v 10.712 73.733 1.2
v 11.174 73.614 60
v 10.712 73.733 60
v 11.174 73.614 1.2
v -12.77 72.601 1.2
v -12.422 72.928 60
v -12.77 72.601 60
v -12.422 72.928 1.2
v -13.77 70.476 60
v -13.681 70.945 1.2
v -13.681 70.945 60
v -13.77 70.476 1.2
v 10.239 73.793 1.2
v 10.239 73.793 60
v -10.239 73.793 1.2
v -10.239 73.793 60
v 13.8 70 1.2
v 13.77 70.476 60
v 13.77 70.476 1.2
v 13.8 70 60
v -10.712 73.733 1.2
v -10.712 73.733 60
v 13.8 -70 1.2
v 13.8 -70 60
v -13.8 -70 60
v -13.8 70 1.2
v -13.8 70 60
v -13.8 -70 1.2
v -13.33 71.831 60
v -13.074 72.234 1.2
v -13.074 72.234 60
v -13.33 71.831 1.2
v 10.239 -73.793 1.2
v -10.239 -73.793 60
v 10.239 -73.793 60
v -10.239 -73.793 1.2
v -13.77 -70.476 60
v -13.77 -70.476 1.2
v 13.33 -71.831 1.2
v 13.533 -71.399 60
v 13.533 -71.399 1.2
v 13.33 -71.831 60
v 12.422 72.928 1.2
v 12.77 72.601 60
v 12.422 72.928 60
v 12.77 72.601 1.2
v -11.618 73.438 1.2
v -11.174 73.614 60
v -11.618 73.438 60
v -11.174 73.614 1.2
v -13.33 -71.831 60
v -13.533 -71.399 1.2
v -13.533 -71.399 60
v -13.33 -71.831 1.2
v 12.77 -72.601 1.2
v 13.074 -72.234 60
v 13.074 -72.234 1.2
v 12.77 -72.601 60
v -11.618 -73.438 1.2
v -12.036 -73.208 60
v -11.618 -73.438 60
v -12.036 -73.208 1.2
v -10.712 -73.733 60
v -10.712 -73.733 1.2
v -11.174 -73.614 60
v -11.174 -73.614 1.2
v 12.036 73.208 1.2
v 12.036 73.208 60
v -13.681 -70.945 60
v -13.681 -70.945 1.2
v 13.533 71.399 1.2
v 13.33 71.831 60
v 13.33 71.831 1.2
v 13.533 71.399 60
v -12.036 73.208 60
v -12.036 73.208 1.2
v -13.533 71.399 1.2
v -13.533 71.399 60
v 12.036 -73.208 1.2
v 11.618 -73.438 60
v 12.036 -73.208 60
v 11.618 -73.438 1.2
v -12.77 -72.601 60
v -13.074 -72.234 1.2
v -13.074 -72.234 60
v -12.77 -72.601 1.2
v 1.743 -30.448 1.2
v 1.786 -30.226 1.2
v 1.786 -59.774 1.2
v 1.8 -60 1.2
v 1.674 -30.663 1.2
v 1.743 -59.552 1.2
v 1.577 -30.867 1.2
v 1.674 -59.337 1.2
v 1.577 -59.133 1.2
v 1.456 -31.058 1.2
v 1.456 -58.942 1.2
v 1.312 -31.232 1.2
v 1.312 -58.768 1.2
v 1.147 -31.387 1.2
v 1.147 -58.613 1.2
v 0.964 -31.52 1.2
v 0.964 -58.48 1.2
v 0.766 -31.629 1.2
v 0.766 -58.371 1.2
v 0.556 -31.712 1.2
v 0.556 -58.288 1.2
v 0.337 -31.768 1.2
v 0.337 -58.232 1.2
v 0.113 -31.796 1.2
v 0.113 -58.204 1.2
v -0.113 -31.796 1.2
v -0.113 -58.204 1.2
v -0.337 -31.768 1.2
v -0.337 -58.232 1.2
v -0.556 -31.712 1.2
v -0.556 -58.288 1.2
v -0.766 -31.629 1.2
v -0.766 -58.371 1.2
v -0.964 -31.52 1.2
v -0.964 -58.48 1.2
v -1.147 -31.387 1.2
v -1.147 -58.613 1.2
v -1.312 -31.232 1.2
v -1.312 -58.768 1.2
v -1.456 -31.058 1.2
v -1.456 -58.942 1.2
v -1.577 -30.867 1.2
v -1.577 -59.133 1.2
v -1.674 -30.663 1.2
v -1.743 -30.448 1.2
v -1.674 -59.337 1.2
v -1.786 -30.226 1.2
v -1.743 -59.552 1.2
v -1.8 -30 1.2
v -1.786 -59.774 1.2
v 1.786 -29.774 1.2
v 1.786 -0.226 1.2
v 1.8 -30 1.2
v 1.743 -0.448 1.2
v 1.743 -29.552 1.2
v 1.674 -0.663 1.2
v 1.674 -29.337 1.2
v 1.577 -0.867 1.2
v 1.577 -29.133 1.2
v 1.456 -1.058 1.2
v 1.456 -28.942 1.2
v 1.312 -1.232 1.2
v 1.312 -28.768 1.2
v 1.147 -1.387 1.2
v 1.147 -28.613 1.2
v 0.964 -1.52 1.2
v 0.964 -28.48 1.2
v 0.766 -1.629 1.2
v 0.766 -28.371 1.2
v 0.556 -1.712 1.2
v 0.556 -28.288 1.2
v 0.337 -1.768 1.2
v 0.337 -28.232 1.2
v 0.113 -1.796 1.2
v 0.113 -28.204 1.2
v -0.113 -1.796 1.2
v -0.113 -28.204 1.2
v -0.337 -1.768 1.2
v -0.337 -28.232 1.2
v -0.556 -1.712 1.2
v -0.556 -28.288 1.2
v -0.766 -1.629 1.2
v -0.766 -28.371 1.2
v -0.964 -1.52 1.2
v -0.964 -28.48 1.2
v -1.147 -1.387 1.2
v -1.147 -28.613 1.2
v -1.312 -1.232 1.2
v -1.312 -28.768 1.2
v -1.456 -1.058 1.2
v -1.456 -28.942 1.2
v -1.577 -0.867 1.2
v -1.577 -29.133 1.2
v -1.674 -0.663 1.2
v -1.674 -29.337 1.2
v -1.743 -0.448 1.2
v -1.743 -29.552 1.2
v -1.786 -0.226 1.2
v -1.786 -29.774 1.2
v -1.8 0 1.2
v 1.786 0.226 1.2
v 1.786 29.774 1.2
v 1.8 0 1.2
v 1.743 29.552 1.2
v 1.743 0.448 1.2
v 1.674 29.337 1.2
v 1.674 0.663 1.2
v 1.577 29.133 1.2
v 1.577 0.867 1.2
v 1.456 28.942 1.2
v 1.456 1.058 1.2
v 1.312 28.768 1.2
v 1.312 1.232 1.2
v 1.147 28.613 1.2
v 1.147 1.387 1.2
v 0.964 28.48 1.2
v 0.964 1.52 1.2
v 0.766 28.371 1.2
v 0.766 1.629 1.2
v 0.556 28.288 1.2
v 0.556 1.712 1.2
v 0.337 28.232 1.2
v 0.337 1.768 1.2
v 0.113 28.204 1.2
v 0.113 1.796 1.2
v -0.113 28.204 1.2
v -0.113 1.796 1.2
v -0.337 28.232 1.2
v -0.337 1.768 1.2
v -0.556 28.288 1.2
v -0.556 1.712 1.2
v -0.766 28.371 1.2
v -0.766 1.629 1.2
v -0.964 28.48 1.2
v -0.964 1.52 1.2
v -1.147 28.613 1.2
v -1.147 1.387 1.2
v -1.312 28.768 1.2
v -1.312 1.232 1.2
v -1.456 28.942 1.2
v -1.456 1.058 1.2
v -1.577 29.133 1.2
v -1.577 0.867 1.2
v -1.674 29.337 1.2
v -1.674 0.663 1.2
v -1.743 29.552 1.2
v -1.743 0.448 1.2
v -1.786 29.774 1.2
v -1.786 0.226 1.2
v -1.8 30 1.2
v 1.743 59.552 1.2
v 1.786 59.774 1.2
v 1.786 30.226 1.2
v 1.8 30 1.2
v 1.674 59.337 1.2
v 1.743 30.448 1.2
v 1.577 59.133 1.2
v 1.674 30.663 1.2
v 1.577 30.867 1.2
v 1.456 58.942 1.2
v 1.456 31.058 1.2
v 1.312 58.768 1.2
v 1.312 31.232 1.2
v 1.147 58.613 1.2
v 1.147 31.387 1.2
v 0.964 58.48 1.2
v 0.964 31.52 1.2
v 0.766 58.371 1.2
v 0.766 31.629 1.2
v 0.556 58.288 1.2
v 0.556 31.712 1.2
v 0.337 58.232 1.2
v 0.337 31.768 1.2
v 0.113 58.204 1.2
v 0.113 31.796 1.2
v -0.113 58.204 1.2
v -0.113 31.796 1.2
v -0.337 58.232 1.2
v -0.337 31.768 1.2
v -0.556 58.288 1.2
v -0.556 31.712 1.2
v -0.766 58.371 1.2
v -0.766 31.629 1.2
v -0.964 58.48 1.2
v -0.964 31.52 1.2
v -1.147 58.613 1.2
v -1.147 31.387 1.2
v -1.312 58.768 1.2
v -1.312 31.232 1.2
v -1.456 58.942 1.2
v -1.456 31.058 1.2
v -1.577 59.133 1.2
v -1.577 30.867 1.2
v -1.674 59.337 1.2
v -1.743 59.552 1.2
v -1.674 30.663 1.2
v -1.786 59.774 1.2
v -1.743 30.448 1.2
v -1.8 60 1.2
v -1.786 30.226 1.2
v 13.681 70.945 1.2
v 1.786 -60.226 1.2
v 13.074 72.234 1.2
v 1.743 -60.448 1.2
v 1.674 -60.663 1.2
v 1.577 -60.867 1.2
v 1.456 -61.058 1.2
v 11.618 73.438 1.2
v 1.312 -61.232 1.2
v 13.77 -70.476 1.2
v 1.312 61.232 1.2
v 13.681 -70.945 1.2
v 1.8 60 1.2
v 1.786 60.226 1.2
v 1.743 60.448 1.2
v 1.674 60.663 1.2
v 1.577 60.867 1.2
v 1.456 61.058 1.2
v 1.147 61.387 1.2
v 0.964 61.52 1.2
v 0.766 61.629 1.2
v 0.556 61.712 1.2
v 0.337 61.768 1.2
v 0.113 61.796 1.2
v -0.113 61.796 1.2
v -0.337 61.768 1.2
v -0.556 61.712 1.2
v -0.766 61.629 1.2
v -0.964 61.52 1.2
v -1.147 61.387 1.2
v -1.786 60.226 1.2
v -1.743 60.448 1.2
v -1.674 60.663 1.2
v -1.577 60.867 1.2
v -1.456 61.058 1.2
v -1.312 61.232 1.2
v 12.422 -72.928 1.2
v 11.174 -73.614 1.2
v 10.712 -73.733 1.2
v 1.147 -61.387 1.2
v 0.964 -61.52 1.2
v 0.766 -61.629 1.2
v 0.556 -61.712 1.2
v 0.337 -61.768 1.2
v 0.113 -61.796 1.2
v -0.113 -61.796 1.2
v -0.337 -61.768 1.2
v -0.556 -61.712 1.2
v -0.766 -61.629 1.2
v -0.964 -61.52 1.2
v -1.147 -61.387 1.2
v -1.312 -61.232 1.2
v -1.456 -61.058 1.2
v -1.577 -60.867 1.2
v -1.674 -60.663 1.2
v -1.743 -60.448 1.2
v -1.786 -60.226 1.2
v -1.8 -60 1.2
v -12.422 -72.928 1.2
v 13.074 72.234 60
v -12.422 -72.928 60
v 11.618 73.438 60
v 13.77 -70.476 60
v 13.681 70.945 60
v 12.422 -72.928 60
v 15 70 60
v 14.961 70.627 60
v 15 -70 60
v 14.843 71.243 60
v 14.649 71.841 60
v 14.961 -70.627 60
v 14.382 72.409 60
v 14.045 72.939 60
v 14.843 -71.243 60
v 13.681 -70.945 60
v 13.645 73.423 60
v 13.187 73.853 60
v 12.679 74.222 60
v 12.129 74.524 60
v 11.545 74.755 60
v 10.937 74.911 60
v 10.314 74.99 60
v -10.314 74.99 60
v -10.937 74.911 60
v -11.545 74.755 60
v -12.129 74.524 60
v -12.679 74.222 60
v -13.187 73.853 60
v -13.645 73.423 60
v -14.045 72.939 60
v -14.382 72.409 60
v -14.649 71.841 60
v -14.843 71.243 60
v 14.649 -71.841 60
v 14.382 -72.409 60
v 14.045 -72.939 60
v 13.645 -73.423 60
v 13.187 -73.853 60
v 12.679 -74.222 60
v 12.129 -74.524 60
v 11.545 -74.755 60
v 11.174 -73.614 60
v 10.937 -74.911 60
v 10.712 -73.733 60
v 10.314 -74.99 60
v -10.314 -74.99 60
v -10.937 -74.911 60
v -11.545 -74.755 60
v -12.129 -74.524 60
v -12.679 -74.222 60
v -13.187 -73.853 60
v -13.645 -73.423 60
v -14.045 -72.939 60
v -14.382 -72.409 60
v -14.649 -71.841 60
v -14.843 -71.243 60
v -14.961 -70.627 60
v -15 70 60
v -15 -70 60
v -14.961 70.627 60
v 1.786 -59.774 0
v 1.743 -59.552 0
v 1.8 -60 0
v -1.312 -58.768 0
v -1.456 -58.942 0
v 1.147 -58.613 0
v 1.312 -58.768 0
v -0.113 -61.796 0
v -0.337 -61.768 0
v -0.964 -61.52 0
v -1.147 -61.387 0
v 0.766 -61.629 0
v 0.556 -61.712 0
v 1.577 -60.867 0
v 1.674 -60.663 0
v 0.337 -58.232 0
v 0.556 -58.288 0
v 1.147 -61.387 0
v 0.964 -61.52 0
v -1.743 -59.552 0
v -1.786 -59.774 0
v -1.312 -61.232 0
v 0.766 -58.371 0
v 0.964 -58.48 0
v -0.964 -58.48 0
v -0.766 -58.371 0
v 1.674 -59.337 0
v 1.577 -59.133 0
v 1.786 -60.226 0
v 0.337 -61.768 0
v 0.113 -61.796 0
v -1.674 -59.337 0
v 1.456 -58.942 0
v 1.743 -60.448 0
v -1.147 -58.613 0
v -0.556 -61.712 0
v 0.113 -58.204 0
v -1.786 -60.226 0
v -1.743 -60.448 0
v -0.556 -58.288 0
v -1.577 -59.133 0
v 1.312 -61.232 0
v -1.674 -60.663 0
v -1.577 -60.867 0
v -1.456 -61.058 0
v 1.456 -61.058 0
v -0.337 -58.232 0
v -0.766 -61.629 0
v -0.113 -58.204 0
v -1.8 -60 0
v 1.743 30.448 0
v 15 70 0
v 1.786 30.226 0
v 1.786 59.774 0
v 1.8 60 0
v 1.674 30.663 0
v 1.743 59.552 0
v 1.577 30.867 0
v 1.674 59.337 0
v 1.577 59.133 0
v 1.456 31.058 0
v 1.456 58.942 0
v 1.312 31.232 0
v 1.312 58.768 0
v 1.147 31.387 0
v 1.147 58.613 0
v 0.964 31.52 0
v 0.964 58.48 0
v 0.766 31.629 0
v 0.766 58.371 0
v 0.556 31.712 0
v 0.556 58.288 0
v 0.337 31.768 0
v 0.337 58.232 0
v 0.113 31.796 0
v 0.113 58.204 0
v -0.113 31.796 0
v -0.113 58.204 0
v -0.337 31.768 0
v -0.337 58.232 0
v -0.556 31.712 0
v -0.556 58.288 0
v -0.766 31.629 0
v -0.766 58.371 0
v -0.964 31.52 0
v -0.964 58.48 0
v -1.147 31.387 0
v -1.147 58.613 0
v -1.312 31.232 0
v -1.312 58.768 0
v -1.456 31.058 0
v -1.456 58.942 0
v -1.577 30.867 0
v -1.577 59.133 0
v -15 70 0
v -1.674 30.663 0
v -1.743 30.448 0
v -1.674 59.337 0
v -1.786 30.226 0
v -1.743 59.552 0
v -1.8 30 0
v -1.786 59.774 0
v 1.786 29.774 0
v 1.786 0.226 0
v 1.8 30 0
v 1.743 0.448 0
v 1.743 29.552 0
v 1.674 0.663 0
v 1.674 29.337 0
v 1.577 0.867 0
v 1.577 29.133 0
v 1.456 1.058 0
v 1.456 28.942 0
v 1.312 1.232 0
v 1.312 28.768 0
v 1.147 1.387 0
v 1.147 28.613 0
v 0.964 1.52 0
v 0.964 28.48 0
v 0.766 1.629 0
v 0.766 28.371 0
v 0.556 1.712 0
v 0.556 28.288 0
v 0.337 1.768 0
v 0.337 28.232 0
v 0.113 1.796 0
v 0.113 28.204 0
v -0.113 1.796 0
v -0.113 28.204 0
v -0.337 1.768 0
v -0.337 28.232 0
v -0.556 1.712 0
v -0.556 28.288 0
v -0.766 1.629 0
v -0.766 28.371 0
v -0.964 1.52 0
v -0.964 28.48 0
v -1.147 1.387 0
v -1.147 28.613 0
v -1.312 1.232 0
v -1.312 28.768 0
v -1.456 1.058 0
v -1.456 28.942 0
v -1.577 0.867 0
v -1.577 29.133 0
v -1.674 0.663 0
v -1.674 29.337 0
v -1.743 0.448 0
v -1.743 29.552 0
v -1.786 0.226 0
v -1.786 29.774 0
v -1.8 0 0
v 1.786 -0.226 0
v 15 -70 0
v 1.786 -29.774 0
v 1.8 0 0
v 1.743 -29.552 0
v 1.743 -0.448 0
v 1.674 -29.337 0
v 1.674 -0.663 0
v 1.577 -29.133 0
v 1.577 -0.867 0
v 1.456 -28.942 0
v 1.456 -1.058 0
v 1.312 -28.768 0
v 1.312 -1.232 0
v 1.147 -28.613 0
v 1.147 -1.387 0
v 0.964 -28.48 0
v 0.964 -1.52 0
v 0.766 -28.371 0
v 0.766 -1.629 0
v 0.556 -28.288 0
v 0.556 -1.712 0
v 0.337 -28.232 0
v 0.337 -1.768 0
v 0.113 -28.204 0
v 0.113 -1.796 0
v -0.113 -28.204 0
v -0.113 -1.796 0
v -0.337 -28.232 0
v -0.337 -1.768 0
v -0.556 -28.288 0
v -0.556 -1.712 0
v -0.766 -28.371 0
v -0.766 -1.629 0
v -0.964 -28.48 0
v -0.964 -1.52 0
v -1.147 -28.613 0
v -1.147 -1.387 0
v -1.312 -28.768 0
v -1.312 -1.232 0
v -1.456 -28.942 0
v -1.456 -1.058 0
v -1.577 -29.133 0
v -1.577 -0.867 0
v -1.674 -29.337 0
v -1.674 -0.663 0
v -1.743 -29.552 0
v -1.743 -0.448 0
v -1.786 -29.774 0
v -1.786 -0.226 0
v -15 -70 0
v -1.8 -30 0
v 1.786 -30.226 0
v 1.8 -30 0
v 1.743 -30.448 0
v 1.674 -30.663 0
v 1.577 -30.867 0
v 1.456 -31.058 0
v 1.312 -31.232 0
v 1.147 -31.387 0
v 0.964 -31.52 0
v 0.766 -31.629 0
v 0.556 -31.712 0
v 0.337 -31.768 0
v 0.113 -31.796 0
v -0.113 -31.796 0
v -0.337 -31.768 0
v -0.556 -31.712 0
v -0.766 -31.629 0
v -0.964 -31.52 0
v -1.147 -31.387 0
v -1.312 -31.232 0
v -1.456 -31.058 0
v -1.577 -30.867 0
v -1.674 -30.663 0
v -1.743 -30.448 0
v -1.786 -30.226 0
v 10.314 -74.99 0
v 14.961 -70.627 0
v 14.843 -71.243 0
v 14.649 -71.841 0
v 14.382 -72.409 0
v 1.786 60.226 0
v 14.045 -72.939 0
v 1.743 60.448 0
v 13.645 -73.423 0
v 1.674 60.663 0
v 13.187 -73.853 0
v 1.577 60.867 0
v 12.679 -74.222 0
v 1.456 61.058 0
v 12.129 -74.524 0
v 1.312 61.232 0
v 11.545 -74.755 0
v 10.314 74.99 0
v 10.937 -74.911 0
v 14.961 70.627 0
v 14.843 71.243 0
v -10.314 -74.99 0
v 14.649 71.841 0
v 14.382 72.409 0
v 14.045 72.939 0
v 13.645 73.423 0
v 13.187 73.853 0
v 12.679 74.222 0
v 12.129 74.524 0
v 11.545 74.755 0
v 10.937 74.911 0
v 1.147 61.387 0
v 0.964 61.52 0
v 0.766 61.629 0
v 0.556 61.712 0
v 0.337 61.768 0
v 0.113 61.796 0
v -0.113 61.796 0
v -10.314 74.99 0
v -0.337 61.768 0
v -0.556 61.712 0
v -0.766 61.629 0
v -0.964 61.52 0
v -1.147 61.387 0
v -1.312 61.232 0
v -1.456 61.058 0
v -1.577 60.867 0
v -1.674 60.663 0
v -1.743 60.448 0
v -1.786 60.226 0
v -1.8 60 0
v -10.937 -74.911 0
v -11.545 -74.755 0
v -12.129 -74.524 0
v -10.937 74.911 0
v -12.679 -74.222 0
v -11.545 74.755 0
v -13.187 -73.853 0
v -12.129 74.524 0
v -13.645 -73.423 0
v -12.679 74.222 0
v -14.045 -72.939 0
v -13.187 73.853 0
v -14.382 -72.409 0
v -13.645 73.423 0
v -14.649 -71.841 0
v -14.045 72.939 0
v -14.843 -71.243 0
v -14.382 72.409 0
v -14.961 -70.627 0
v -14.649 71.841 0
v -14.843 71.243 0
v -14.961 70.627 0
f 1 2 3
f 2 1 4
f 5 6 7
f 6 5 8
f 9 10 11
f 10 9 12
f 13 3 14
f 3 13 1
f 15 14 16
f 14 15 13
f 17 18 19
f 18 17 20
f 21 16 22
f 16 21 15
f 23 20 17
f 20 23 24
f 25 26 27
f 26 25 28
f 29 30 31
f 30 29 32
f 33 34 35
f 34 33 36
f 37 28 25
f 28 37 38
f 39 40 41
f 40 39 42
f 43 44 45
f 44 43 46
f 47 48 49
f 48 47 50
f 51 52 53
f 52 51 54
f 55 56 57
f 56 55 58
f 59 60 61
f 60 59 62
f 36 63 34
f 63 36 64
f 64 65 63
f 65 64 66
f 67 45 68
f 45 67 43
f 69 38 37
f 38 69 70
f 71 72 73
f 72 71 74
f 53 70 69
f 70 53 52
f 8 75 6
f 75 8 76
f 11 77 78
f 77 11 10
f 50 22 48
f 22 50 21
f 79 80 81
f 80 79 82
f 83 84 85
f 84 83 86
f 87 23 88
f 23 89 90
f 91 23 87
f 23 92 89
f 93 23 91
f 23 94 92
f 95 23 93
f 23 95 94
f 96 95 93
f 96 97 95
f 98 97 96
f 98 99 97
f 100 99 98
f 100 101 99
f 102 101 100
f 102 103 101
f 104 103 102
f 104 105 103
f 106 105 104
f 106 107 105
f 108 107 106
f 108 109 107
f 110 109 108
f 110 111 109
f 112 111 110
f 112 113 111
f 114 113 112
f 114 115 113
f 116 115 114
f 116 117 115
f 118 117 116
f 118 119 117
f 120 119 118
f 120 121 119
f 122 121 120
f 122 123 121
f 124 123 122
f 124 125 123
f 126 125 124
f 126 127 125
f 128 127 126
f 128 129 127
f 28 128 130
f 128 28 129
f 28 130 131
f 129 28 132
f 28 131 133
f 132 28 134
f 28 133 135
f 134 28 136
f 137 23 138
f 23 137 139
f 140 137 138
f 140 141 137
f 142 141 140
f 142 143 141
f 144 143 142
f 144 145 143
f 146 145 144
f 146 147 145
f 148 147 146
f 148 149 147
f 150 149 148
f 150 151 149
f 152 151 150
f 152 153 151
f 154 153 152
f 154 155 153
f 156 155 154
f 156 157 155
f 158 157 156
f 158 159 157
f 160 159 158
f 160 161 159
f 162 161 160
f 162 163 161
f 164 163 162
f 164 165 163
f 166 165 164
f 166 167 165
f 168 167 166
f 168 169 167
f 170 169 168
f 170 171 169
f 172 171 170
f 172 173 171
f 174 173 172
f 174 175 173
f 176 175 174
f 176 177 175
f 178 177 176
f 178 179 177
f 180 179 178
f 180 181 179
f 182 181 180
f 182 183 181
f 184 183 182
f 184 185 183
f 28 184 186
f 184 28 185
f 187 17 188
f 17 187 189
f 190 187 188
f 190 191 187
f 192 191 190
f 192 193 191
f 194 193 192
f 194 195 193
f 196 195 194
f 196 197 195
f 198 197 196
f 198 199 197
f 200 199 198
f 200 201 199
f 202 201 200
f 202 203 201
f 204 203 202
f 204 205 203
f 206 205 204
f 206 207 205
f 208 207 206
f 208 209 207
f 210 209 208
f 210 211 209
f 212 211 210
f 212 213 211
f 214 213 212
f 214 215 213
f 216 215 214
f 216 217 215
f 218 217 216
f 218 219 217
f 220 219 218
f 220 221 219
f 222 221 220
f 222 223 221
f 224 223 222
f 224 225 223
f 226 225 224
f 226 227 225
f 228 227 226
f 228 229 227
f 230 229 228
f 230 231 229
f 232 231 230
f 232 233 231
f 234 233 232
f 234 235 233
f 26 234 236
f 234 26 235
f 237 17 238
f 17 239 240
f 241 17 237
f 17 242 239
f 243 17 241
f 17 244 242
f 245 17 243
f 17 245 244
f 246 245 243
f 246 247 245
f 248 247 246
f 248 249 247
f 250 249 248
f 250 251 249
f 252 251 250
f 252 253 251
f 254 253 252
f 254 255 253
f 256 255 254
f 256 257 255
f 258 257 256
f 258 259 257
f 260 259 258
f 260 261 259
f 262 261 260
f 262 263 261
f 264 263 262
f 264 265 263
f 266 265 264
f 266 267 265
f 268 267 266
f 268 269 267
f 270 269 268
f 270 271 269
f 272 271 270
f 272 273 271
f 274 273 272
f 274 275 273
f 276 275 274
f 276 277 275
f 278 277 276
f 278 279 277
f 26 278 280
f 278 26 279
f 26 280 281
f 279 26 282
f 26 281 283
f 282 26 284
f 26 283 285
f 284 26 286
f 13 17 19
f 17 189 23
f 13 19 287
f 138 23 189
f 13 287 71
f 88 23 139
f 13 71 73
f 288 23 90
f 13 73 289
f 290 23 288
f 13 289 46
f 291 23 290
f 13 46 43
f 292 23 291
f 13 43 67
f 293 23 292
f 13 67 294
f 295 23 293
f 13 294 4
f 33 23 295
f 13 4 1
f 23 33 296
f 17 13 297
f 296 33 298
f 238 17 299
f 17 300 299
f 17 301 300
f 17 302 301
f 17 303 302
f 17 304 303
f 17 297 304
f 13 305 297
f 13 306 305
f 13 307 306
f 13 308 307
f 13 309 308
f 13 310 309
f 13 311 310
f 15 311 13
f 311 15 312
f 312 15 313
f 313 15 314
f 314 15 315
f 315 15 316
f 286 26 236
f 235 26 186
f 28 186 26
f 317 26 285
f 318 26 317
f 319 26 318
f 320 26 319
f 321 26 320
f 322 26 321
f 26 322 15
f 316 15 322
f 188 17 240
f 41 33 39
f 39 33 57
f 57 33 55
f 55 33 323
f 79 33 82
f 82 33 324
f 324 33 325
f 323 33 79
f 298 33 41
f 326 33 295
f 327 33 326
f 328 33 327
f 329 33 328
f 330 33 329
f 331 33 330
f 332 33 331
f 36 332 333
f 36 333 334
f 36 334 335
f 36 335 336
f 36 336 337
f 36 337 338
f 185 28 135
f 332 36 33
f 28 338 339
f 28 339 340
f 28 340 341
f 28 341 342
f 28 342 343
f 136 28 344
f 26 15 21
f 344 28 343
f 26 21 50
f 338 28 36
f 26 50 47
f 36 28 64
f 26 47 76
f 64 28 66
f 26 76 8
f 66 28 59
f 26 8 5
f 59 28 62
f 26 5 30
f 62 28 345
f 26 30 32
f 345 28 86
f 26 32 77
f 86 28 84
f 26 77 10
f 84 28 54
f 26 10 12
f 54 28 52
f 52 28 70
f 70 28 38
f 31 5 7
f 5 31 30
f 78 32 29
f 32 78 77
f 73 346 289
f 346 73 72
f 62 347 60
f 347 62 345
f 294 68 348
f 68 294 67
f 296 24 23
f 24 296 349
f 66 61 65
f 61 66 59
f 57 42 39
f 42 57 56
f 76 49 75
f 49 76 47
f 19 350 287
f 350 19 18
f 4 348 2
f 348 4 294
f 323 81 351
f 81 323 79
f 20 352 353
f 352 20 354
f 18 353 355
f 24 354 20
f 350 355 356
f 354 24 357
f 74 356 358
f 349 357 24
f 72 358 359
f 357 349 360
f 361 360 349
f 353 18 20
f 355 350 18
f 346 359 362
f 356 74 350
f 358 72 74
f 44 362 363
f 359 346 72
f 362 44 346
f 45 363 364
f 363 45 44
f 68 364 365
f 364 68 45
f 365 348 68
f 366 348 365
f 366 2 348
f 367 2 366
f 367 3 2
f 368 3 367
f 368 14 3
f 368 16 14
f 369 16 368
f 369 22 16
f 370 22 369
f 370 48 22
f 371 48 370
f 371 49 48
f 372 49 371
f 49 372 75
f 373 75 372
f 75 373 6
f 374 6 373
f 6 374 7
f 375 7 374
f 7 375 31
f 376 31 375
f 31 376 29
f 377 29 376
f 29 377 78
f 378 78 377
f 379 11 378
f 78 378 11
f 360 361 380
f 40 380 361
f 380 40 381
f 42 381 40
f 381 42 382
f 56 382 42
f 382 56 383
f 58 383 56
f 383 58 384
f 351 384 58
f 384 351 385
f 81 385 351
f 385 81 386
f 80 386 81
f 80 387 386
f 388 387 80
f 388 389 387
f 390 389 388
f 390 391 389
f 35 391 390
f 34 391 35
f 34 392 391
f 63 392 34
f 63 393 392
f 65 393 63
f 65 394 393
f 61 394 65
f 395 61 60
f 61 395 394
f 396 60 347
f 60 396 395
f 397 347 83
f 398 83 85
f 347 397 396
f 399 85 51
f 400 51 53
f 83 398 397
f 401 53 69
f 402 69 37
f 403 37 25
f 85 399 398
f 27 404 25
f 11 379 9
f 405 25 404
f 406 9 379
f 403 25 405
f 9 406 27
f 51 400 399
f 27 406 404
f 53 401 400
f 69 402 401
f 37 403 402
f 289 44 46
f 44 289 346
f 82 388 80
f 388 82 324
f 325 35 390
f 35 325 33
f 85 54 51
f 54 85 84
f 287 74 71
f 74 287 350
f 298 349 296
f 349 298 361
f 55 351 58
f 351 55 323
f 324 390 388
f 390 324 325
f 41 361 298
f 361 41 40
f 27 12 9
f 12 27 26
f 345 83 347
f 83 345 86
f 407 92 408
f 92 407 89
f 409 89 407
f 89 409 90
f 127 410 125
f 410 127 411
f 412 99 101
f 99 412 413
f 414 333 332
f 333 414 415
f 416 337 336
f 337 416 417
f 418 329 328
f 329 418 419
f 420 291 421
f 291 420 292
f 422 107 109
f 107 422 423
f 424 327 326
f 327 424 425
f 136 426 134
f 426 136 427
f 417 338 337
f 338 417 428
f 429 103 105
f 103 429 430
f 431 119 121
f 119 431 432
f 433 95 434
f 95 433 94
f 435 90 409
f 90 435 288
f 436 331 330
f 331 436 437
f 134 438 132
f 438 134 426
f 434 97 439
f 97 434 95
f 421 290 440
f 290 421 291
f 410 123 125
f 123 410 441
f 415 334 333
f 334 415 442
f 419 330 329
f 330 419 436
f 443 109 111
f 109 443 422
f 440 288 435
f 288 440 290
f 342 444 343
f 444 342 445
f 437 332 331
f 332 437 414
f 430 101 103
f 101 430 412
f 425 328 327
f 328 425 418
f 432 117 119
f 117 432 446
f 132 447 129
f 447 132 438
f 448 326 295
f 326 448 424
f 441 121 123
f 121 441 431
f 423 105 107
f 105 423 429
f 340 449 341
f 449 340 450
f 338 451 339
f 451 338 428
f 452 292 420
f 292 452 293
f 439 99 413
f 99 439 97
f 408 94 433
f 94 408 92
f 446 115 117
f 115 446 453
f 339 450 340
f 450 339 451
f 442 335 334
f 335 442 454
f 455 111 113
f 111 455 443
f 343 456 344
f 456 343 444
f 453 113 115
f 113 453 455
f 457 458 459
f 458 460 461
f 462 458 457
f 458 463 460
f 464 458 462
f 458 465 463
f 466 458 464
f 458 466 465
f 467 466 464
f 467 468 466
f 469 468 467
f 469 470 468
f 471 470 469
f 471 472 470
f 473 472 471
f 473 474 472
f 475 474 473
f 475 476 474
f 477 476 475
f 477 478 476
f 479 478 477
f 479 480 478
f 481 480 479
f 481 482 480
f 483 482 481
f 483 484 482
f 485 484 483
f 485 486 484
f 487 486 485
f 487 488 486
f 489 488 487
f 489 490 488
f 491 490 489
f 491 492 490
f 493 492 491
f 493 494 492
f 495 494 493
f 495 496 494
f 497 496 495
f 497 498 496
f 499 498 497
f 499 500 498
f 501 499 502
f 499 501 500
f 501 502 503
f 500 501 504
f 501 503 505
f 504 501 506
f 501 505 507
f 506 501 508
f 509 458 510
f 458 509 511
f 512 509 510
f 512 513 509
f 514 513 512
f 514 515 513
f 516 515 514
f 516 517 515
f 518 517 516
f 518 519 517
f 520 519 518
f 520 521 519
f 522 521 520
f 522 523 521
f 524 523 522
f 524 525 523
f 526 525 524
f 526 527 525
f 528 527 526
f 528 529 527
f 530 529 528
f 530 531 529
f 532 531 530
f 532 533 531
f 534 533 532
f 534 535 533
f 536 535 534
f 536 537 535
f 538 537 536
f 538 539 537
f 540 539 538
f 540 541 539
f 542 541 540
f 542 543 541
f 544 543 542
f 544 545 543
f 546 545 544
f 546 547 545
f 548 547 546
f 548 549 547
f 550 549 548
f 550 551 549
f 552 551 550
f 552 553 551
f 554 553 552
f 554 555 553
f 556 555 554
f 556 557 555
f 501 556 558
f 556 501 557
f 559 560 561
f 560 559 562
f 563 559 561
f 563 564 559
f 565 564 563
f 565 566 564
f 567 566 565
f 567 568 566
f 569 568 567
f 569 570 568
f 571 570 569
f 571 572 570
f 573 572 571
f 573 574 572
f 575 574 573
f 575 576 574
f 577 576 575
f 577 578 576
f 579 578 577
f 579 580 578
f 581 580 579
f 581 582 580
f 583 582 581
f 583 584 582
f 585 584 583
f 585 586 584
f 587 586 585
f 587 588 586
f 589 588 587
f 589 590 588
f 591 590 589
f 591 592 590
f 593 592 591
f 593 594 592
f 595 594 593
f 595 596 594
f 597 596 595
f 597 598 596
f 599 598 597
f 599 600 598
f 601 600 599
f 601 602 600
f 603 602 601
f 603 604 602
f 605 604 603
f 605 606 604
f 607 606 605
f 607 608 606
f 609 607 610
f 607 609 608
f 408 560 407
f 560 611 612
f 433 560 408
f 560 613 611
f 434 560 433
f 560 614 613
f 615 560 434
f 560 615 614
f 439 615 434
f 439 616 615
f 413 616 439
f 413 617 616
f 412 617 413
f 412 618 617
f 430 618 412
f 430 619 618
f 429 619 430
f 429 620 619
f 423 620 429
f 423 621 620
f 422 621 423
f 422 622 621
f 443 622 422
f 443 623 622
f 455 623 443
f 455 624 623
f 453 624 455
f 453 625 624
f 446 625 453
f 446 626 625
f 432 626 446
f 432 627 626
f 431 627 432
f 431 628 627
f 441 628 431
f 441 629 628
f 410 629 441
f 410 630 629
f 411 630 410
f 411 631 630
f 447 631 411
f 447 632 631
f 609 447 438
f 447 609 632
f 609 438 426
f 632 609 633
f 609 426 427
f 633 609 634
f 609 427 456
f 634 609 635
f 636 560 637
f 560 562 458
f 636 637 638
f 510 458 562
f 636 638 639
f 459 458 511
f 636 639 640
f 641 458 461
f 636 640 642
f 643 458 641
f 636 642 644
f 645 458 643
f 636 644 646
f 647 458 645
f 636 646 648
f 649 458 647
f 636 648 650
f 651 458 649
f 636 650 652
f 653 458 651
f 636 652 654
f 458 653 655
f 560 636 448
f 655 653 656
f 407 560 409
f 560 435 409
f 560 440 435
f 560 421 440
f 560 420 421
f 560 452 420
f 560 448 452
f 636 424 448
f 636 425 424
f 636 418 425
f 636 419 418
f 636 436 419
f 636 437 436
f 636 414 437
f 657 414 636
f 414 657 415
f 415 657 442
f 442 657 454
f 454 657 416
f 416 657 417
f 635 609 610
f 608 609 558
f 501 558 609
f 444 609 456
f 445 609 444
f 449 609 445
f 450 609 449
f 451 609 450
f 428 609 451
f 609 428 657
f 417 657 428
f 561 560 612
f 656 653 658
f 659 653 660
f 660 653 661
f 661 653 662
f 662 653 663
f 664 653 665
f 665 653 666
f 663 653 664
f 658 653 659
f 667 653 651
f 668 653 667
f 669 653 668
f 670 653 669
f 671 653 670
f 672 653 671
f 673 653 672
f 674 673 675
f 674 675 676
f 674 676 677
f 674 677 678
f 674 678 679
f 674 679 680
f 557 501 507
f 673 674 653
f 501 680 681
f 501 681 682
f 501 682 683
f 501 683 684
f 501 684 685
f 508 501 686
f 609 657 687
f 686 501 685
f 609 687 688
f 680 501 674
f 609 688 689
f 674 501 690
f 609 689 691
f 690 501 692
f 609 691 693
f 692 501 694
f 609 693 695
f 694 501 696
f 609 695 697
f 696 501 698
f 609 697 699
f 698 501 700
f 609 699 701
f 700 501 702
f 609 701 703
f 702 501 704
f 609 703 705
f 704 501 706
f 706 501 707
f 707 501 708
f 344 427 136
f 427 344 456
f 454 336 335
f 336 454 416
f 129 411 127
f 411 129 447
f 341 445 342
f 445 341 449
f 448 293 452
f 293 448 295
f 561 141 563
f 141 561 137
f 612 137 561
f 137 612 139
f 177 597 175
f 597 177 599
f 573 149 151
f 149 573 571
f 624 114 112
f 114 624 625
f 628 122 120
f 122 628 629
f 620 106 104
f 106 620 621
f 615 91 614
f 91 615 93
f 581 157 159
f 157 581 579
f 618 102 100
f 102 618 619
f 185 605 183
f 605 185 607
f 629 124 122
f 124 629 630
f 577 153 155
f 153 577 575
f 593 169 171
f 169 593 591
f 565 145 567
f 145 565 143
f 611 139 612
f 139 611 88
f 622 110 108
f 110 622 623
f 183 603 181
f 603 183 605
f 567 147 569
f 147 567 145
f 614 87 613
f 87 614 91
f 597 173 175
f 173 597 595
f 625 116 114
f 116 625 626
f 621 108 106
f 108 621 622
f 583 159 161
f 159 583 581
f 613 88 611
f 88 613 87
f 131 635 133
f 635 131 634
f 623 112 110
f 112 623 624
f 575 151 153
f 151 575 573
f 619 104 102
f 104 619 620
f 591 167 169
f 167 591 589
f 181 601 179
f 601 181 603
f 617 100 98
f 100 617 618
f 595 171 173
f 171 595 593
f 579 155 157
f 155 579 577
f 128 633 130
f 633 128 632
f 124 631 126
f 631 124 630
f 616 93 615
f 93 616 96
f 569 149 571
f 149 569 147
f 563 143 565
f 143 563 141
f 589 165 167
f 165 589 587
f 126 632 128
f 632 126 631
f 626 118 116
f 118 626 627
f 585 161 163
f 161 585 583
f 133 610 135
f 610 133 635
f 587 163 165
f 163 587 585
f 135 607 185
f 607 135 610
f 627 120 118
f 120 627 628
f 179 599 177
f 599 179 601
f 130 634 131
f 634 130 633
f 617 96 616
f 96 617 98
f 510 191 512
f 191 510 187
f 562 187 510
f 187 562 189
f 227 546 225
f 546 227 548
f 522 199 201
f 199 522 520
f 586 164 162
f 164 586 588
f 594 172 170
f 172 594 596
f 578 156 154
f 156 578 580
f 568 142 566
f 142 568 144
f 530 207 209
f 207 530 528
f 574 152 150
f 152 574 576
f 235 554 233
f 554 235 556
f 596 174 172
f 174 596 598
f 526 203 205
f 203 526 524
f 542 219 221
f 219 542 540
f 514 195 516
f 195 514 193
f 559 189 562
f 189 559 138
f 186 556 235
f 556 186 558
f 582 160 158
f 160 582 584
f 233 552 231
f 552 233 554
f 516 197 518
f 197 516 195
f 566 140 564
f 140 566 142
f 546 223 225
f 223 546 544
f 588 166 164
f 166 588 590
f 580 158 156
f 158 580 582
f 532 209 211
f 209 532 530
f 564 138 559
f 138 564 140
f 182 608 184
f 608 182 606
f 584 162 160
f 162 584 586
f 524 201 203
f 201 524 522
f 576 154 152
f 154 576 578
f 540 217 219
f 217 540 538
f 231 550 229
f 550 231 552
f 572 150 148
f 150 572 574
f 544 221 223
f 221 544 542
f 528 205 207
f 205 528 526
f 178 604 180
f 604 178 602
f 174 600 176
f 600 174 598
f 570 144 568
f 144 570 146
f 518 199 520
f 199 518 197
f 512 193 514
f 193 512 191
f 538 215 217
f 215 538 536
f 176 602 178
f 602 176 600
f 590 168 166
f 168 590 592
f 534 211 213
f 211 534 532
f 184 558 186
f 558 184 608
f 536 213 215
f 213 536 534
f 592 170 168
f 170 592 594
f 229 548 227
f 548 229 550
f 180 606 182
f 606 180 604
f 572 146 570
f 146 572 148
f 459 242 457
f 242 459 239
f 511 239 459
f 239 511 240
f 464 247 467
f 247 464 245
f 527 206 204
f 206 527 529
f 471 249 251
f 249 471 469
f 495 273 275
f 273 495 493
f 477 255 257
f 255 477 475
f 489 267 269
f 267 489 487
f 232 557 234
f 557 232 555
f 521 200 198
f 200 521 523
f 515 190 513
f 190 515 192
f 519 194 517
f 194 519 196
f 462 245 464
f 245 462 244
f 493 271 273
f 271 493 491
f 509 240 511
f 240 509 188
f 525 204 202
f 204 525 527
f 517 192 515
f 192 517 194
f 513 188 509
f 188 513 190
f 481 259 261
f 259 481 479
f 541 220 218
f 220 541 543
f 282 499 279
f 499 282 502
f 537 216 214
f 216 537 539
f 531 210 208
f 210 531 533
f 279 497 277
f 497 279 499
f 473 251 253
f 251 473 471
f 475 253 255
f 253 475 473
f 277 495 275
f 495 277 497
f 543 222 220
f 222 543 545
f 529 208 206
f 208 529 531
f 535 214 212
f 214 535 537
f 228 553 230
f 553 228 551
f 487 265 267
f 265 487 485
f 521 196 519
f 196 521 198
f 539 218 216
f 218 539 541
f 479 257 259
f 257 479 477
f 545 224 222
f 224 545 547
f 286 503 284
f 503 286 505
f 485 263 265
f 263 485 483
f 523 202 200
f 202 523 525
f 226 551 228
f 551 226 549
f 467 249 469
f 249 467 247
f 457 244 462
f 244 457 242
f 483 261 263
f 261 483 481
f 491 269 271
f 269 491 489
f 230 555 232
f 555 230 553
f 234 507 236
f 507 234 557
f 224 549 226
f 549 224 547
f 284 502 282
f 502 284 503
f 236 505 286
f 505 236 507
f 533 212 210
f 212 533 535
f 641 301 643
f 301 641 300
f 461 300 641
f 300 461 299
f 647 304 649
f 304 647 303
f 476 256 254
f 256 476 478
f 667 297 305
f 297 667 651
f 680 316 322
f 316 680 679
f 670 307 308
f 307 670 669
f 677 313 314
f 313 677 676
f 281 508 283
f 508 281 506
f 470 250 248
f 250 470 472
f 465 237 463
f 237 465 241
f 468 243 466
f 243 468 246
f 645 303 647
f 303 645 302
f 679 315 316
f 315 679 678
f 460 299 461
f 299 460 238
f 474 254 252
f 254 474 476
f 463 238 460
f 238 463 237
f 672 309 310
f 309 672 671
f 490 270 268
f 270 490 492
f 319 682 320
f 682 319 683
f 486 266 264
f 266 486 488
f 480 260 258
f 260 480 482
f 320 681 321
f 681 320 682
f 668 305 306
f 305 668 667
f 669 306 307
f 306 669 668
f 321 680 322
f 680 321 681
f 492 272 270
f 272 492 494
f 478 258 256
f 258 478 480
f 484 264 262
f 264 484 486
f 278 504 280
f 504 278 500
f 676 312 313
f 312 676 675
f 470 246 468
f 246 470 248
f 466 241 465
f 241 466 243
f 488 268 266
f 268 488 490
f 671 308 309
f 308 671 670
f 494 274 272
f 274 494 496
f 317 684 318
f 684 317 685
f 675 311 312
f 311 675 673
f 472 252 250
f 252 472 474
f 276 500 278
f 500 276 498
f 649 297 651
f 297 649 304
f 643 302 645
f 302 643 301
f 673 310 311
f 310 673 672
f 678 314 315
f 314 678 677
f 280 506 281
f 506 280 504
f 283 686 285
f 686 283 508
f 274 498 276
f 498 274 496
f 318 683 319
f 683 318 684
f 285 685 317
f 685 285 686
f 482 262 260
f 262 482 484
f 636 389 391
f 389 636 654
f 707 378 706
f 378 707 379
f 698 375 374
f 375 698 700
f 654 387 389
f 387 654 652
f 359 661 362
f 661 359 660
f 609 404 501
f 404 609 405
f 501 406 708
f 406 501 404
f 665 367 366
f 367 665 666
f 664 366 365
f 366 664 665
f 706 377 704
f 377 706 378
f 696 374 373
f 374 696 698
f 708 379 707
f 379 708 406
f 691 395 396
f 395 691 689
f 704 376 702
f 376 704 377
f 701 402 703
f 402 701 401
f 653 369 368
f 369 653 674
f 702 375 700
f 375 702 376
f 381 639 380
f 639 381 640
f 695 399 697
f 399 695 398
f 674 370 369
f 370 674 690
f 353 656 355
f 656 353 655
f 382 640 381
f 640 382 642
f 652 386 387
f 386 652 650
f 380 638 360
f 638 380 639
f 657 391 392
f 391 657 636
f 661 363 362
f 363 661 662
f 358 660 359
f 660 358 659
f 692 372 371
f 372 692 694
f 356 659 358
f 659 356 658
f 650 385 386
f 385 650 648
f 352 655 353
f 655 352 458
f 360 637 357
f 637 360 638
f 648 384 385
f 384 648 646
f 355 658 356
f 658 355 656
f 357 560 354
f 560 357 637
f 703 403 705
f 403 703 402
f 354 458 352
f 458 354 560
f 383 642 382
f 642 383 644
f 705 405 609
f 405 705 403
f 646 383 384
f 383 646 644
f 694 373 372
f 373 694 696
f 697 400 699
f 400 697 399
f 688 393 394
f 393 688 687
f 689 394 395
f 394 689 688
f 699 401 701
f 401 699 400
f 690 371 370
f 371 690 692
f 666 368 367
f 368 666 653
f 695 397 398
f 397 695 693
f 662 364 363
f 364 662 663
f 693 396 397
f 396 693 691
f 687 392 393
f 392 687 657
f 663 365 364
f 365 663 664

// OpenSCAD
$fn = 50;


difference() {
	union() {
		hull() {
			translate(v = [-10.0000000000, 70.0000000000, 0]) {
				cylinder(h = 60, r = 5);
			}
			translate(v = [10.0000000000, 70.0000000000, 0]) {
				cylinder(h = 60, r = 5);
			}
			translate(v = [-10.0000000000, -70.0000000000, 0]) {
				cylinder(h = 60, r = 5);
			}
			translate(v = [10.0000000000, -70.0000000000, 0]) {
				cylinder(h = 60, r = 5);
			}
		}
	}
	union() {
		translate(v = [0, 0, 1.2000000000]) {
			hull() {
				translate(v = [-10.0000000000, 70.0000000000, 0]) {
					cylinder(h = 58.8000000000, r = 3.8000000000);
				}
				translate(v = [10.0000000000, 70.0000000000, 0]) {
					cylinder(h = 58.8000000000, r = 3.8000000000);
				}
				translate(v = [-10.0000000000, -70.0000000000, 0]) {
					cylinder(h = 58.8000000000, r = 3.8000000000);
				}
				translate(v = [10.0000000000, -70.0000000000, 0]) {
					cylinder(h = 58.8000000000, r = 3.8000000000);
				}
			}
		}
		#translate(v = [0.0000000000, -60.0000000000, 0]) {
			cylinder(h = 1.2000000000, r = 1.8000000000);
		}
		#translate(v = [0.0000000000, -30.0000000000, 0]) {
			cylinder(h = 1.2000000000, r = 1.8000000000);
		}
		#cylinder(h = 1.2000000000, r = 1.8000000000);
		#translate(v = [0.0000000000, 30.0000000000, 0]) {
			cylinder(h = 1.2000000000, r = 1.8000000000);
		}
		#translate(v = [0.0000000000, 60.0000000000, 0]) {
			cylinder(h = 1.2000000000, r = 1.8000000000);
		}
	}
}
